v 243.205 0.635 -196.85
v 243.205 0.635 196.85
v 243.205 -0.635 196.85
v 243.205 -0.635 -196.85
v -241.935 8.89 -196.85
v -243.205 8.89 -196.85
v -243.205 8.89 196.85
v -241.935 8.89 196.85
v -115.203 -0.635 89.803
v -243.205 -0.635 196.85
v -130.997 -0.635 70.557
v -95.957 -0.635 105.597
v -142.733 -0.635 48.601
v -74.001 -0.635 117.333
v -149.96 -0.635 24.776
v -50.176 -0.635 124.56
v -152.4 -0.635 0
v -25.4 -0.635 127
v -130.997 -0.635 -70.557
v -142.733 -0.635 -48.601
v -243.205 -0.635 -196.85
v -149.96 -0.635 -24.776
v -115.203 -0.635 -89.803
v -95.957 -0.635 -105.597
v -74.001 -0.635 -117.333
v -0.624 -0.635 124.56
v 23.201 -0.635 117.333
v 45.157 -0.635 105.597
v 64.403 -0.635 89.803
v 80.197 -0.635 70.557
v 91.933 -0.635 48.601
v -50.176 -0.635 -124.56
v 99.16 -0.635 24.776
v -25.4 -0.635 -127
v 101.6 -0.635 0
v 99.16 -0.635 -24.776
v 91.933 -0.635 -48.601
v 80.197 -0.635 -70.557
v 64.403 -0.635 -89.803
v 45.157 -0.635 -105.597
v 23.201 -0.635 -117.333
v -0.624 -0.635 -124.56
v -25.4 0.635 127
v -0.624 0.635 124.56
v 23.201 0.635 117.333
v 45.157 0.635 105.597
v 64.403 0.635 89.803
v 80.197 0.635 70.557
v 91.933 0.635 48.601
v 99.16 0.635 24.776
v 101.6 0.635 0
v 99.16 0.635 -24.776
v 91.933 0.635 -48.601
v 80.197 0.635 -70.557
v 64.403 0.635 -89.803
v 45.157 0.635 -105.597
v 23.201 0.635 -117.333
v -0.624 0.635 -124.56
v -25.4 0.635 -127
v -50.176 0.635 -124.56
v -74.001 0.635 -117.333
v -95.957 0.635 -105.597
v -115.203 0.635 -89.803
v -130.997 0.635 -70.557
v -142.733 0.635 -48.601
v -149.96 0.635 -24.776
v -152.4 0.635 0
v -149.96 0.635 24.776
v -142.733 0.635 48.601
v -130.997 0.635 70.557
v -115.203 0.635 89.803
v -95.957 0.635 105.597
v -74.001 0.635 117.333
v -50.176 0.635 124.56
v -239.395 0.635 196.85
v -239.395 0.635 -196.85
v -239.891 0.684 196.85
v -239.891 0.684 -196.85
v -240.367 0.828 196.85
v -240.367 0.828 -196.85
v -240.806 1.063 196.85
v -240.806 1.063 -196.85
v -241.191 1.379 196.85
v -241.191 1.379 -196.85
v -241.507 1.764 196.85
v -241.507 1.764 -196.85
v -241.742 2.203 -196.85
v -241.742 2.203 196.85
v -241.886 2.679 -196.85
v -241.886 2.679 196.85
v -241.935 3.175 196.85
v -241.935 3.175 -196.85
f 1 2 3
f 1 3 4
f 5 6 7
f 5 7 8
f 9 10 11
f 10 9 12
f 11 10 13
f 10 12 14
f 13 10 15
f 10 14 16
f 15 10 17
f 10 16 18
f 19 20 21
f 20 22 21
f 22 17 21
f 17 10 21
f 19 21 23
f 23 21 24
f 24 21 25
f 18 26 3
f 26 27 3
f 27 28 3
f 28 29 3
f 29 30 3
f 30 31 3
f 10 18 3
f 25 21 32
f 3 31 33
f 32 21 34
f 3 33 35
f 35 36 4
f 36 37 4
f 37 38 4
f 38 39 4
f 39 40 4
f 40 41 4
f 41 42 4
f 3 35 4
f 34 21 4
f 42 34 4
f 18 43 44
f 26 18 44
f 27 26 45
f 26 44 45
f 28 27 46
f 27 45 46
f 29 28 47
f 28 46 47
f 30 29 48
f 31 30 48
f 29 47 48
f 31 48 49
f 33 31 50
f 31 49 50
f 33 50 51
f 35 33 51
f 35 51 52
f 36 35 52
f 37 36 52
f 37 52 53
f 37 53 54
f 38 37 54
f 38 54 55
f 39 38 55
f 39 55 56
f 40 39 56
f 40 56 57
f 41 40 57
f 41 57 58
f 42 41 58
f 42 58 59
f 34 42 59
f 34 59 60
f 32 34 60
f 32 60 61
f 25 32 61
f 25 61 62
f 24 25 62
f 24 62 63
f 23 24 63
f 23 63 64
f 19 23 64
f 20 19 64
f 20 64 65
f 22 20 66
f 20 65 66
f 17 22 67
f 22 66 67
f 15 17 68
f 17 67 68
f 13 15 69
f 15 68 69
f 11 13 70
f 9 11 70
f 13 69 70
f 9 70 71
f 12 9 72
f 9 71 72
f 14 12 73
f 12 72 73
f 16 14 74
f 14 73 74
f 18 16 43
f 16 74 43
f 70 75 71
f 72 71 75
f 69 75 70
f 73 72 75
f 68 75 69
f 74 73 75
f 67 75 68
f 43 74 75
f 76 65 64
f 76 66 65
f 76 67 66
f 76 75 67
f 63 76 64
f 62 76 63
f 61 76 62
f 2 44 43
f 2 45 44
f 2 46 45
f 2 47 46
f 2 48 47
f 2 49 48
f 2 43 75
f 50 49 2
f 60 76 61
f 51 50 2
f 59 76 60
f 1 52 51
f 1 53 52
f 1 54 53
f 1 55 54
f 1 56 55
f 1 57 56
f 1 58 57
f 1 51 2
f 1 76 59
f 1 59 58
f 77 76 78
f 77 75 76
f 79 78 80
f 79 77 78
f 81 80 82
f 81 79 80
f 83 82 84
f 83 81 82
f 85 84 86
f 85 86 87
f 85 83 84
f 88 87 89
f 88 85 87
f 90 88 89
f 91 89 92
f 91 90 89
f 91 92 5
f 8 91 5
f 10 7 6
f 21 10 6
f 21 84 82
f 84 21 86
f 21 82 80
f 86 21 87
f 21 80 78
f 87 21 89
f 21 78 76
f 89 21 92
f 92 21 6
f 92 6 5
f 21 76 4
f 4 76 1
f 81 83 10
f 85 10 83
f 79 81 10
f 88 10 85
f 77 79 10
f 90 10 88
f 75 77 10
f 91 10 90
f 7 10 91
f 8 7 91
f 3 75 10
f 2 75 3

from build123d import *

# Parameters (mm, degrees)
SKETCH1_W                       = 486.41
SKETCH1_H                       = 393.7
BOSS_EXTRUDE1_DEPTH             = 0.635
SKETCH2_R                       = 127
CUT_EXTRUDE1_DEPTH              = 313.89008841
BOSS_EXTRUDE2_REACH             = 314.888
SKETCH6_W                       = 1.27
SKETCH6_H                       = 9.525
BOSS_EXTRUDE2_DIRECTION_2_REACH = 314.888
FILLET1_R                       = 2.54


with BuildPart() as part:
    # Sketch1 → Boss-Extrude1 (new, symmetric)
    with BuildSketch(Plane(origin=(0, 0, 0), x_dir=(1, 0, 0), z_dir=(0, 1, 0))):
        Rectangle(SKETCH1_W, SKETCH1_H)
    extrude(amount=BOSS_EXTRUDE1_DEPTH, both=True)

    # Sketch2 → Cut-Extrude1 (cut, through all)
    with BuildSketch(Plane(origin=(0, 0.635, 0), x_dir=(1, 0, 0), z_dir=(0, 1, 0))):
        with Locations(Location((-25.4, 0, 0), (0, 0, 270))):
            Circle(SKETCH2_R)
    extrude(amount=-CUT_EXTRUDE1_DEPTH, mode=Mode.SUBTRACT)

    # Boss-Extrude2: up to this face of the body (flat: up to its plane)
    boss_extrude2_end = Plane(part.part.faces().sort_by_distance((0, 0, 196.85))[0])
    # Sketch6 → Boss-Extrude2 (add, up to the picked face)
    with BuildSketch(Plane.XY, mode=Mode.PRIVATE) as boss_extrude2_sk1:
        with Locations((-242.57, 4.1275)):
            Rectangle(SKETCH6_W, SKETCH6_H)
    boss_extrude2_tool1 = split(extrude(boss_extrude2_sk1.sketch, amount=BOSS_EXTRUDE2_REACH, mode=Mode.PRIVATE), bisect_by=boss_extrude2_end, keep=Keep.BOTH, mode=Mode.PRIVATE)
    add(boss_extrude2_tool1.solids().sort_by(Axis((-242.57, 4.1275, 0), (0, 0, 1)))[0])

    # Boss-Extrude2 direction 2: up to this face of the body (flat: up to its plane)
    boss_extrude2_direction_2_end = Plane(part.part.faces().sort_by_distance((0, 0, -196.85))[0])
    # Sketch6 → Boss-Extrude2 direction 2 (add, up to the picked face)
    with BuildSketch(Plane.XY, mode=Mode.PRIVATE) as boss_extrude2_direction_2_sk1:
        with Locations((-242.57, 4.1275)):
            Rectangle(SKETCH6_W, SKETCH6_H)
    boss_extrude2_direction_2_tool1 = split(extrude(boss_extrude2_direction_2_sk1.sketch, amount=-BOSS_EXTRUDE2_DIRECTION_2_REACH, mode=Mode.PRIVATE), bisect_by=boss_extrude2_direction_2_end, keep=Keep.BOTH, mode=Mode.PRIVATE)
    add(boss_extrude2_direction_2_tool1.solids().sort_by(Axis((-242.57, 4.1275, 0), (0, 0, -1)))[0])

    # Fillet1
    fillet1_edges = [part.edges().sort_by_distance(p)[0] for p in [
        (-241.935, 0.635, 0),
    ]]
    fillet(fillet1_edges, radius=FILLET1_R)


solid = part.part
